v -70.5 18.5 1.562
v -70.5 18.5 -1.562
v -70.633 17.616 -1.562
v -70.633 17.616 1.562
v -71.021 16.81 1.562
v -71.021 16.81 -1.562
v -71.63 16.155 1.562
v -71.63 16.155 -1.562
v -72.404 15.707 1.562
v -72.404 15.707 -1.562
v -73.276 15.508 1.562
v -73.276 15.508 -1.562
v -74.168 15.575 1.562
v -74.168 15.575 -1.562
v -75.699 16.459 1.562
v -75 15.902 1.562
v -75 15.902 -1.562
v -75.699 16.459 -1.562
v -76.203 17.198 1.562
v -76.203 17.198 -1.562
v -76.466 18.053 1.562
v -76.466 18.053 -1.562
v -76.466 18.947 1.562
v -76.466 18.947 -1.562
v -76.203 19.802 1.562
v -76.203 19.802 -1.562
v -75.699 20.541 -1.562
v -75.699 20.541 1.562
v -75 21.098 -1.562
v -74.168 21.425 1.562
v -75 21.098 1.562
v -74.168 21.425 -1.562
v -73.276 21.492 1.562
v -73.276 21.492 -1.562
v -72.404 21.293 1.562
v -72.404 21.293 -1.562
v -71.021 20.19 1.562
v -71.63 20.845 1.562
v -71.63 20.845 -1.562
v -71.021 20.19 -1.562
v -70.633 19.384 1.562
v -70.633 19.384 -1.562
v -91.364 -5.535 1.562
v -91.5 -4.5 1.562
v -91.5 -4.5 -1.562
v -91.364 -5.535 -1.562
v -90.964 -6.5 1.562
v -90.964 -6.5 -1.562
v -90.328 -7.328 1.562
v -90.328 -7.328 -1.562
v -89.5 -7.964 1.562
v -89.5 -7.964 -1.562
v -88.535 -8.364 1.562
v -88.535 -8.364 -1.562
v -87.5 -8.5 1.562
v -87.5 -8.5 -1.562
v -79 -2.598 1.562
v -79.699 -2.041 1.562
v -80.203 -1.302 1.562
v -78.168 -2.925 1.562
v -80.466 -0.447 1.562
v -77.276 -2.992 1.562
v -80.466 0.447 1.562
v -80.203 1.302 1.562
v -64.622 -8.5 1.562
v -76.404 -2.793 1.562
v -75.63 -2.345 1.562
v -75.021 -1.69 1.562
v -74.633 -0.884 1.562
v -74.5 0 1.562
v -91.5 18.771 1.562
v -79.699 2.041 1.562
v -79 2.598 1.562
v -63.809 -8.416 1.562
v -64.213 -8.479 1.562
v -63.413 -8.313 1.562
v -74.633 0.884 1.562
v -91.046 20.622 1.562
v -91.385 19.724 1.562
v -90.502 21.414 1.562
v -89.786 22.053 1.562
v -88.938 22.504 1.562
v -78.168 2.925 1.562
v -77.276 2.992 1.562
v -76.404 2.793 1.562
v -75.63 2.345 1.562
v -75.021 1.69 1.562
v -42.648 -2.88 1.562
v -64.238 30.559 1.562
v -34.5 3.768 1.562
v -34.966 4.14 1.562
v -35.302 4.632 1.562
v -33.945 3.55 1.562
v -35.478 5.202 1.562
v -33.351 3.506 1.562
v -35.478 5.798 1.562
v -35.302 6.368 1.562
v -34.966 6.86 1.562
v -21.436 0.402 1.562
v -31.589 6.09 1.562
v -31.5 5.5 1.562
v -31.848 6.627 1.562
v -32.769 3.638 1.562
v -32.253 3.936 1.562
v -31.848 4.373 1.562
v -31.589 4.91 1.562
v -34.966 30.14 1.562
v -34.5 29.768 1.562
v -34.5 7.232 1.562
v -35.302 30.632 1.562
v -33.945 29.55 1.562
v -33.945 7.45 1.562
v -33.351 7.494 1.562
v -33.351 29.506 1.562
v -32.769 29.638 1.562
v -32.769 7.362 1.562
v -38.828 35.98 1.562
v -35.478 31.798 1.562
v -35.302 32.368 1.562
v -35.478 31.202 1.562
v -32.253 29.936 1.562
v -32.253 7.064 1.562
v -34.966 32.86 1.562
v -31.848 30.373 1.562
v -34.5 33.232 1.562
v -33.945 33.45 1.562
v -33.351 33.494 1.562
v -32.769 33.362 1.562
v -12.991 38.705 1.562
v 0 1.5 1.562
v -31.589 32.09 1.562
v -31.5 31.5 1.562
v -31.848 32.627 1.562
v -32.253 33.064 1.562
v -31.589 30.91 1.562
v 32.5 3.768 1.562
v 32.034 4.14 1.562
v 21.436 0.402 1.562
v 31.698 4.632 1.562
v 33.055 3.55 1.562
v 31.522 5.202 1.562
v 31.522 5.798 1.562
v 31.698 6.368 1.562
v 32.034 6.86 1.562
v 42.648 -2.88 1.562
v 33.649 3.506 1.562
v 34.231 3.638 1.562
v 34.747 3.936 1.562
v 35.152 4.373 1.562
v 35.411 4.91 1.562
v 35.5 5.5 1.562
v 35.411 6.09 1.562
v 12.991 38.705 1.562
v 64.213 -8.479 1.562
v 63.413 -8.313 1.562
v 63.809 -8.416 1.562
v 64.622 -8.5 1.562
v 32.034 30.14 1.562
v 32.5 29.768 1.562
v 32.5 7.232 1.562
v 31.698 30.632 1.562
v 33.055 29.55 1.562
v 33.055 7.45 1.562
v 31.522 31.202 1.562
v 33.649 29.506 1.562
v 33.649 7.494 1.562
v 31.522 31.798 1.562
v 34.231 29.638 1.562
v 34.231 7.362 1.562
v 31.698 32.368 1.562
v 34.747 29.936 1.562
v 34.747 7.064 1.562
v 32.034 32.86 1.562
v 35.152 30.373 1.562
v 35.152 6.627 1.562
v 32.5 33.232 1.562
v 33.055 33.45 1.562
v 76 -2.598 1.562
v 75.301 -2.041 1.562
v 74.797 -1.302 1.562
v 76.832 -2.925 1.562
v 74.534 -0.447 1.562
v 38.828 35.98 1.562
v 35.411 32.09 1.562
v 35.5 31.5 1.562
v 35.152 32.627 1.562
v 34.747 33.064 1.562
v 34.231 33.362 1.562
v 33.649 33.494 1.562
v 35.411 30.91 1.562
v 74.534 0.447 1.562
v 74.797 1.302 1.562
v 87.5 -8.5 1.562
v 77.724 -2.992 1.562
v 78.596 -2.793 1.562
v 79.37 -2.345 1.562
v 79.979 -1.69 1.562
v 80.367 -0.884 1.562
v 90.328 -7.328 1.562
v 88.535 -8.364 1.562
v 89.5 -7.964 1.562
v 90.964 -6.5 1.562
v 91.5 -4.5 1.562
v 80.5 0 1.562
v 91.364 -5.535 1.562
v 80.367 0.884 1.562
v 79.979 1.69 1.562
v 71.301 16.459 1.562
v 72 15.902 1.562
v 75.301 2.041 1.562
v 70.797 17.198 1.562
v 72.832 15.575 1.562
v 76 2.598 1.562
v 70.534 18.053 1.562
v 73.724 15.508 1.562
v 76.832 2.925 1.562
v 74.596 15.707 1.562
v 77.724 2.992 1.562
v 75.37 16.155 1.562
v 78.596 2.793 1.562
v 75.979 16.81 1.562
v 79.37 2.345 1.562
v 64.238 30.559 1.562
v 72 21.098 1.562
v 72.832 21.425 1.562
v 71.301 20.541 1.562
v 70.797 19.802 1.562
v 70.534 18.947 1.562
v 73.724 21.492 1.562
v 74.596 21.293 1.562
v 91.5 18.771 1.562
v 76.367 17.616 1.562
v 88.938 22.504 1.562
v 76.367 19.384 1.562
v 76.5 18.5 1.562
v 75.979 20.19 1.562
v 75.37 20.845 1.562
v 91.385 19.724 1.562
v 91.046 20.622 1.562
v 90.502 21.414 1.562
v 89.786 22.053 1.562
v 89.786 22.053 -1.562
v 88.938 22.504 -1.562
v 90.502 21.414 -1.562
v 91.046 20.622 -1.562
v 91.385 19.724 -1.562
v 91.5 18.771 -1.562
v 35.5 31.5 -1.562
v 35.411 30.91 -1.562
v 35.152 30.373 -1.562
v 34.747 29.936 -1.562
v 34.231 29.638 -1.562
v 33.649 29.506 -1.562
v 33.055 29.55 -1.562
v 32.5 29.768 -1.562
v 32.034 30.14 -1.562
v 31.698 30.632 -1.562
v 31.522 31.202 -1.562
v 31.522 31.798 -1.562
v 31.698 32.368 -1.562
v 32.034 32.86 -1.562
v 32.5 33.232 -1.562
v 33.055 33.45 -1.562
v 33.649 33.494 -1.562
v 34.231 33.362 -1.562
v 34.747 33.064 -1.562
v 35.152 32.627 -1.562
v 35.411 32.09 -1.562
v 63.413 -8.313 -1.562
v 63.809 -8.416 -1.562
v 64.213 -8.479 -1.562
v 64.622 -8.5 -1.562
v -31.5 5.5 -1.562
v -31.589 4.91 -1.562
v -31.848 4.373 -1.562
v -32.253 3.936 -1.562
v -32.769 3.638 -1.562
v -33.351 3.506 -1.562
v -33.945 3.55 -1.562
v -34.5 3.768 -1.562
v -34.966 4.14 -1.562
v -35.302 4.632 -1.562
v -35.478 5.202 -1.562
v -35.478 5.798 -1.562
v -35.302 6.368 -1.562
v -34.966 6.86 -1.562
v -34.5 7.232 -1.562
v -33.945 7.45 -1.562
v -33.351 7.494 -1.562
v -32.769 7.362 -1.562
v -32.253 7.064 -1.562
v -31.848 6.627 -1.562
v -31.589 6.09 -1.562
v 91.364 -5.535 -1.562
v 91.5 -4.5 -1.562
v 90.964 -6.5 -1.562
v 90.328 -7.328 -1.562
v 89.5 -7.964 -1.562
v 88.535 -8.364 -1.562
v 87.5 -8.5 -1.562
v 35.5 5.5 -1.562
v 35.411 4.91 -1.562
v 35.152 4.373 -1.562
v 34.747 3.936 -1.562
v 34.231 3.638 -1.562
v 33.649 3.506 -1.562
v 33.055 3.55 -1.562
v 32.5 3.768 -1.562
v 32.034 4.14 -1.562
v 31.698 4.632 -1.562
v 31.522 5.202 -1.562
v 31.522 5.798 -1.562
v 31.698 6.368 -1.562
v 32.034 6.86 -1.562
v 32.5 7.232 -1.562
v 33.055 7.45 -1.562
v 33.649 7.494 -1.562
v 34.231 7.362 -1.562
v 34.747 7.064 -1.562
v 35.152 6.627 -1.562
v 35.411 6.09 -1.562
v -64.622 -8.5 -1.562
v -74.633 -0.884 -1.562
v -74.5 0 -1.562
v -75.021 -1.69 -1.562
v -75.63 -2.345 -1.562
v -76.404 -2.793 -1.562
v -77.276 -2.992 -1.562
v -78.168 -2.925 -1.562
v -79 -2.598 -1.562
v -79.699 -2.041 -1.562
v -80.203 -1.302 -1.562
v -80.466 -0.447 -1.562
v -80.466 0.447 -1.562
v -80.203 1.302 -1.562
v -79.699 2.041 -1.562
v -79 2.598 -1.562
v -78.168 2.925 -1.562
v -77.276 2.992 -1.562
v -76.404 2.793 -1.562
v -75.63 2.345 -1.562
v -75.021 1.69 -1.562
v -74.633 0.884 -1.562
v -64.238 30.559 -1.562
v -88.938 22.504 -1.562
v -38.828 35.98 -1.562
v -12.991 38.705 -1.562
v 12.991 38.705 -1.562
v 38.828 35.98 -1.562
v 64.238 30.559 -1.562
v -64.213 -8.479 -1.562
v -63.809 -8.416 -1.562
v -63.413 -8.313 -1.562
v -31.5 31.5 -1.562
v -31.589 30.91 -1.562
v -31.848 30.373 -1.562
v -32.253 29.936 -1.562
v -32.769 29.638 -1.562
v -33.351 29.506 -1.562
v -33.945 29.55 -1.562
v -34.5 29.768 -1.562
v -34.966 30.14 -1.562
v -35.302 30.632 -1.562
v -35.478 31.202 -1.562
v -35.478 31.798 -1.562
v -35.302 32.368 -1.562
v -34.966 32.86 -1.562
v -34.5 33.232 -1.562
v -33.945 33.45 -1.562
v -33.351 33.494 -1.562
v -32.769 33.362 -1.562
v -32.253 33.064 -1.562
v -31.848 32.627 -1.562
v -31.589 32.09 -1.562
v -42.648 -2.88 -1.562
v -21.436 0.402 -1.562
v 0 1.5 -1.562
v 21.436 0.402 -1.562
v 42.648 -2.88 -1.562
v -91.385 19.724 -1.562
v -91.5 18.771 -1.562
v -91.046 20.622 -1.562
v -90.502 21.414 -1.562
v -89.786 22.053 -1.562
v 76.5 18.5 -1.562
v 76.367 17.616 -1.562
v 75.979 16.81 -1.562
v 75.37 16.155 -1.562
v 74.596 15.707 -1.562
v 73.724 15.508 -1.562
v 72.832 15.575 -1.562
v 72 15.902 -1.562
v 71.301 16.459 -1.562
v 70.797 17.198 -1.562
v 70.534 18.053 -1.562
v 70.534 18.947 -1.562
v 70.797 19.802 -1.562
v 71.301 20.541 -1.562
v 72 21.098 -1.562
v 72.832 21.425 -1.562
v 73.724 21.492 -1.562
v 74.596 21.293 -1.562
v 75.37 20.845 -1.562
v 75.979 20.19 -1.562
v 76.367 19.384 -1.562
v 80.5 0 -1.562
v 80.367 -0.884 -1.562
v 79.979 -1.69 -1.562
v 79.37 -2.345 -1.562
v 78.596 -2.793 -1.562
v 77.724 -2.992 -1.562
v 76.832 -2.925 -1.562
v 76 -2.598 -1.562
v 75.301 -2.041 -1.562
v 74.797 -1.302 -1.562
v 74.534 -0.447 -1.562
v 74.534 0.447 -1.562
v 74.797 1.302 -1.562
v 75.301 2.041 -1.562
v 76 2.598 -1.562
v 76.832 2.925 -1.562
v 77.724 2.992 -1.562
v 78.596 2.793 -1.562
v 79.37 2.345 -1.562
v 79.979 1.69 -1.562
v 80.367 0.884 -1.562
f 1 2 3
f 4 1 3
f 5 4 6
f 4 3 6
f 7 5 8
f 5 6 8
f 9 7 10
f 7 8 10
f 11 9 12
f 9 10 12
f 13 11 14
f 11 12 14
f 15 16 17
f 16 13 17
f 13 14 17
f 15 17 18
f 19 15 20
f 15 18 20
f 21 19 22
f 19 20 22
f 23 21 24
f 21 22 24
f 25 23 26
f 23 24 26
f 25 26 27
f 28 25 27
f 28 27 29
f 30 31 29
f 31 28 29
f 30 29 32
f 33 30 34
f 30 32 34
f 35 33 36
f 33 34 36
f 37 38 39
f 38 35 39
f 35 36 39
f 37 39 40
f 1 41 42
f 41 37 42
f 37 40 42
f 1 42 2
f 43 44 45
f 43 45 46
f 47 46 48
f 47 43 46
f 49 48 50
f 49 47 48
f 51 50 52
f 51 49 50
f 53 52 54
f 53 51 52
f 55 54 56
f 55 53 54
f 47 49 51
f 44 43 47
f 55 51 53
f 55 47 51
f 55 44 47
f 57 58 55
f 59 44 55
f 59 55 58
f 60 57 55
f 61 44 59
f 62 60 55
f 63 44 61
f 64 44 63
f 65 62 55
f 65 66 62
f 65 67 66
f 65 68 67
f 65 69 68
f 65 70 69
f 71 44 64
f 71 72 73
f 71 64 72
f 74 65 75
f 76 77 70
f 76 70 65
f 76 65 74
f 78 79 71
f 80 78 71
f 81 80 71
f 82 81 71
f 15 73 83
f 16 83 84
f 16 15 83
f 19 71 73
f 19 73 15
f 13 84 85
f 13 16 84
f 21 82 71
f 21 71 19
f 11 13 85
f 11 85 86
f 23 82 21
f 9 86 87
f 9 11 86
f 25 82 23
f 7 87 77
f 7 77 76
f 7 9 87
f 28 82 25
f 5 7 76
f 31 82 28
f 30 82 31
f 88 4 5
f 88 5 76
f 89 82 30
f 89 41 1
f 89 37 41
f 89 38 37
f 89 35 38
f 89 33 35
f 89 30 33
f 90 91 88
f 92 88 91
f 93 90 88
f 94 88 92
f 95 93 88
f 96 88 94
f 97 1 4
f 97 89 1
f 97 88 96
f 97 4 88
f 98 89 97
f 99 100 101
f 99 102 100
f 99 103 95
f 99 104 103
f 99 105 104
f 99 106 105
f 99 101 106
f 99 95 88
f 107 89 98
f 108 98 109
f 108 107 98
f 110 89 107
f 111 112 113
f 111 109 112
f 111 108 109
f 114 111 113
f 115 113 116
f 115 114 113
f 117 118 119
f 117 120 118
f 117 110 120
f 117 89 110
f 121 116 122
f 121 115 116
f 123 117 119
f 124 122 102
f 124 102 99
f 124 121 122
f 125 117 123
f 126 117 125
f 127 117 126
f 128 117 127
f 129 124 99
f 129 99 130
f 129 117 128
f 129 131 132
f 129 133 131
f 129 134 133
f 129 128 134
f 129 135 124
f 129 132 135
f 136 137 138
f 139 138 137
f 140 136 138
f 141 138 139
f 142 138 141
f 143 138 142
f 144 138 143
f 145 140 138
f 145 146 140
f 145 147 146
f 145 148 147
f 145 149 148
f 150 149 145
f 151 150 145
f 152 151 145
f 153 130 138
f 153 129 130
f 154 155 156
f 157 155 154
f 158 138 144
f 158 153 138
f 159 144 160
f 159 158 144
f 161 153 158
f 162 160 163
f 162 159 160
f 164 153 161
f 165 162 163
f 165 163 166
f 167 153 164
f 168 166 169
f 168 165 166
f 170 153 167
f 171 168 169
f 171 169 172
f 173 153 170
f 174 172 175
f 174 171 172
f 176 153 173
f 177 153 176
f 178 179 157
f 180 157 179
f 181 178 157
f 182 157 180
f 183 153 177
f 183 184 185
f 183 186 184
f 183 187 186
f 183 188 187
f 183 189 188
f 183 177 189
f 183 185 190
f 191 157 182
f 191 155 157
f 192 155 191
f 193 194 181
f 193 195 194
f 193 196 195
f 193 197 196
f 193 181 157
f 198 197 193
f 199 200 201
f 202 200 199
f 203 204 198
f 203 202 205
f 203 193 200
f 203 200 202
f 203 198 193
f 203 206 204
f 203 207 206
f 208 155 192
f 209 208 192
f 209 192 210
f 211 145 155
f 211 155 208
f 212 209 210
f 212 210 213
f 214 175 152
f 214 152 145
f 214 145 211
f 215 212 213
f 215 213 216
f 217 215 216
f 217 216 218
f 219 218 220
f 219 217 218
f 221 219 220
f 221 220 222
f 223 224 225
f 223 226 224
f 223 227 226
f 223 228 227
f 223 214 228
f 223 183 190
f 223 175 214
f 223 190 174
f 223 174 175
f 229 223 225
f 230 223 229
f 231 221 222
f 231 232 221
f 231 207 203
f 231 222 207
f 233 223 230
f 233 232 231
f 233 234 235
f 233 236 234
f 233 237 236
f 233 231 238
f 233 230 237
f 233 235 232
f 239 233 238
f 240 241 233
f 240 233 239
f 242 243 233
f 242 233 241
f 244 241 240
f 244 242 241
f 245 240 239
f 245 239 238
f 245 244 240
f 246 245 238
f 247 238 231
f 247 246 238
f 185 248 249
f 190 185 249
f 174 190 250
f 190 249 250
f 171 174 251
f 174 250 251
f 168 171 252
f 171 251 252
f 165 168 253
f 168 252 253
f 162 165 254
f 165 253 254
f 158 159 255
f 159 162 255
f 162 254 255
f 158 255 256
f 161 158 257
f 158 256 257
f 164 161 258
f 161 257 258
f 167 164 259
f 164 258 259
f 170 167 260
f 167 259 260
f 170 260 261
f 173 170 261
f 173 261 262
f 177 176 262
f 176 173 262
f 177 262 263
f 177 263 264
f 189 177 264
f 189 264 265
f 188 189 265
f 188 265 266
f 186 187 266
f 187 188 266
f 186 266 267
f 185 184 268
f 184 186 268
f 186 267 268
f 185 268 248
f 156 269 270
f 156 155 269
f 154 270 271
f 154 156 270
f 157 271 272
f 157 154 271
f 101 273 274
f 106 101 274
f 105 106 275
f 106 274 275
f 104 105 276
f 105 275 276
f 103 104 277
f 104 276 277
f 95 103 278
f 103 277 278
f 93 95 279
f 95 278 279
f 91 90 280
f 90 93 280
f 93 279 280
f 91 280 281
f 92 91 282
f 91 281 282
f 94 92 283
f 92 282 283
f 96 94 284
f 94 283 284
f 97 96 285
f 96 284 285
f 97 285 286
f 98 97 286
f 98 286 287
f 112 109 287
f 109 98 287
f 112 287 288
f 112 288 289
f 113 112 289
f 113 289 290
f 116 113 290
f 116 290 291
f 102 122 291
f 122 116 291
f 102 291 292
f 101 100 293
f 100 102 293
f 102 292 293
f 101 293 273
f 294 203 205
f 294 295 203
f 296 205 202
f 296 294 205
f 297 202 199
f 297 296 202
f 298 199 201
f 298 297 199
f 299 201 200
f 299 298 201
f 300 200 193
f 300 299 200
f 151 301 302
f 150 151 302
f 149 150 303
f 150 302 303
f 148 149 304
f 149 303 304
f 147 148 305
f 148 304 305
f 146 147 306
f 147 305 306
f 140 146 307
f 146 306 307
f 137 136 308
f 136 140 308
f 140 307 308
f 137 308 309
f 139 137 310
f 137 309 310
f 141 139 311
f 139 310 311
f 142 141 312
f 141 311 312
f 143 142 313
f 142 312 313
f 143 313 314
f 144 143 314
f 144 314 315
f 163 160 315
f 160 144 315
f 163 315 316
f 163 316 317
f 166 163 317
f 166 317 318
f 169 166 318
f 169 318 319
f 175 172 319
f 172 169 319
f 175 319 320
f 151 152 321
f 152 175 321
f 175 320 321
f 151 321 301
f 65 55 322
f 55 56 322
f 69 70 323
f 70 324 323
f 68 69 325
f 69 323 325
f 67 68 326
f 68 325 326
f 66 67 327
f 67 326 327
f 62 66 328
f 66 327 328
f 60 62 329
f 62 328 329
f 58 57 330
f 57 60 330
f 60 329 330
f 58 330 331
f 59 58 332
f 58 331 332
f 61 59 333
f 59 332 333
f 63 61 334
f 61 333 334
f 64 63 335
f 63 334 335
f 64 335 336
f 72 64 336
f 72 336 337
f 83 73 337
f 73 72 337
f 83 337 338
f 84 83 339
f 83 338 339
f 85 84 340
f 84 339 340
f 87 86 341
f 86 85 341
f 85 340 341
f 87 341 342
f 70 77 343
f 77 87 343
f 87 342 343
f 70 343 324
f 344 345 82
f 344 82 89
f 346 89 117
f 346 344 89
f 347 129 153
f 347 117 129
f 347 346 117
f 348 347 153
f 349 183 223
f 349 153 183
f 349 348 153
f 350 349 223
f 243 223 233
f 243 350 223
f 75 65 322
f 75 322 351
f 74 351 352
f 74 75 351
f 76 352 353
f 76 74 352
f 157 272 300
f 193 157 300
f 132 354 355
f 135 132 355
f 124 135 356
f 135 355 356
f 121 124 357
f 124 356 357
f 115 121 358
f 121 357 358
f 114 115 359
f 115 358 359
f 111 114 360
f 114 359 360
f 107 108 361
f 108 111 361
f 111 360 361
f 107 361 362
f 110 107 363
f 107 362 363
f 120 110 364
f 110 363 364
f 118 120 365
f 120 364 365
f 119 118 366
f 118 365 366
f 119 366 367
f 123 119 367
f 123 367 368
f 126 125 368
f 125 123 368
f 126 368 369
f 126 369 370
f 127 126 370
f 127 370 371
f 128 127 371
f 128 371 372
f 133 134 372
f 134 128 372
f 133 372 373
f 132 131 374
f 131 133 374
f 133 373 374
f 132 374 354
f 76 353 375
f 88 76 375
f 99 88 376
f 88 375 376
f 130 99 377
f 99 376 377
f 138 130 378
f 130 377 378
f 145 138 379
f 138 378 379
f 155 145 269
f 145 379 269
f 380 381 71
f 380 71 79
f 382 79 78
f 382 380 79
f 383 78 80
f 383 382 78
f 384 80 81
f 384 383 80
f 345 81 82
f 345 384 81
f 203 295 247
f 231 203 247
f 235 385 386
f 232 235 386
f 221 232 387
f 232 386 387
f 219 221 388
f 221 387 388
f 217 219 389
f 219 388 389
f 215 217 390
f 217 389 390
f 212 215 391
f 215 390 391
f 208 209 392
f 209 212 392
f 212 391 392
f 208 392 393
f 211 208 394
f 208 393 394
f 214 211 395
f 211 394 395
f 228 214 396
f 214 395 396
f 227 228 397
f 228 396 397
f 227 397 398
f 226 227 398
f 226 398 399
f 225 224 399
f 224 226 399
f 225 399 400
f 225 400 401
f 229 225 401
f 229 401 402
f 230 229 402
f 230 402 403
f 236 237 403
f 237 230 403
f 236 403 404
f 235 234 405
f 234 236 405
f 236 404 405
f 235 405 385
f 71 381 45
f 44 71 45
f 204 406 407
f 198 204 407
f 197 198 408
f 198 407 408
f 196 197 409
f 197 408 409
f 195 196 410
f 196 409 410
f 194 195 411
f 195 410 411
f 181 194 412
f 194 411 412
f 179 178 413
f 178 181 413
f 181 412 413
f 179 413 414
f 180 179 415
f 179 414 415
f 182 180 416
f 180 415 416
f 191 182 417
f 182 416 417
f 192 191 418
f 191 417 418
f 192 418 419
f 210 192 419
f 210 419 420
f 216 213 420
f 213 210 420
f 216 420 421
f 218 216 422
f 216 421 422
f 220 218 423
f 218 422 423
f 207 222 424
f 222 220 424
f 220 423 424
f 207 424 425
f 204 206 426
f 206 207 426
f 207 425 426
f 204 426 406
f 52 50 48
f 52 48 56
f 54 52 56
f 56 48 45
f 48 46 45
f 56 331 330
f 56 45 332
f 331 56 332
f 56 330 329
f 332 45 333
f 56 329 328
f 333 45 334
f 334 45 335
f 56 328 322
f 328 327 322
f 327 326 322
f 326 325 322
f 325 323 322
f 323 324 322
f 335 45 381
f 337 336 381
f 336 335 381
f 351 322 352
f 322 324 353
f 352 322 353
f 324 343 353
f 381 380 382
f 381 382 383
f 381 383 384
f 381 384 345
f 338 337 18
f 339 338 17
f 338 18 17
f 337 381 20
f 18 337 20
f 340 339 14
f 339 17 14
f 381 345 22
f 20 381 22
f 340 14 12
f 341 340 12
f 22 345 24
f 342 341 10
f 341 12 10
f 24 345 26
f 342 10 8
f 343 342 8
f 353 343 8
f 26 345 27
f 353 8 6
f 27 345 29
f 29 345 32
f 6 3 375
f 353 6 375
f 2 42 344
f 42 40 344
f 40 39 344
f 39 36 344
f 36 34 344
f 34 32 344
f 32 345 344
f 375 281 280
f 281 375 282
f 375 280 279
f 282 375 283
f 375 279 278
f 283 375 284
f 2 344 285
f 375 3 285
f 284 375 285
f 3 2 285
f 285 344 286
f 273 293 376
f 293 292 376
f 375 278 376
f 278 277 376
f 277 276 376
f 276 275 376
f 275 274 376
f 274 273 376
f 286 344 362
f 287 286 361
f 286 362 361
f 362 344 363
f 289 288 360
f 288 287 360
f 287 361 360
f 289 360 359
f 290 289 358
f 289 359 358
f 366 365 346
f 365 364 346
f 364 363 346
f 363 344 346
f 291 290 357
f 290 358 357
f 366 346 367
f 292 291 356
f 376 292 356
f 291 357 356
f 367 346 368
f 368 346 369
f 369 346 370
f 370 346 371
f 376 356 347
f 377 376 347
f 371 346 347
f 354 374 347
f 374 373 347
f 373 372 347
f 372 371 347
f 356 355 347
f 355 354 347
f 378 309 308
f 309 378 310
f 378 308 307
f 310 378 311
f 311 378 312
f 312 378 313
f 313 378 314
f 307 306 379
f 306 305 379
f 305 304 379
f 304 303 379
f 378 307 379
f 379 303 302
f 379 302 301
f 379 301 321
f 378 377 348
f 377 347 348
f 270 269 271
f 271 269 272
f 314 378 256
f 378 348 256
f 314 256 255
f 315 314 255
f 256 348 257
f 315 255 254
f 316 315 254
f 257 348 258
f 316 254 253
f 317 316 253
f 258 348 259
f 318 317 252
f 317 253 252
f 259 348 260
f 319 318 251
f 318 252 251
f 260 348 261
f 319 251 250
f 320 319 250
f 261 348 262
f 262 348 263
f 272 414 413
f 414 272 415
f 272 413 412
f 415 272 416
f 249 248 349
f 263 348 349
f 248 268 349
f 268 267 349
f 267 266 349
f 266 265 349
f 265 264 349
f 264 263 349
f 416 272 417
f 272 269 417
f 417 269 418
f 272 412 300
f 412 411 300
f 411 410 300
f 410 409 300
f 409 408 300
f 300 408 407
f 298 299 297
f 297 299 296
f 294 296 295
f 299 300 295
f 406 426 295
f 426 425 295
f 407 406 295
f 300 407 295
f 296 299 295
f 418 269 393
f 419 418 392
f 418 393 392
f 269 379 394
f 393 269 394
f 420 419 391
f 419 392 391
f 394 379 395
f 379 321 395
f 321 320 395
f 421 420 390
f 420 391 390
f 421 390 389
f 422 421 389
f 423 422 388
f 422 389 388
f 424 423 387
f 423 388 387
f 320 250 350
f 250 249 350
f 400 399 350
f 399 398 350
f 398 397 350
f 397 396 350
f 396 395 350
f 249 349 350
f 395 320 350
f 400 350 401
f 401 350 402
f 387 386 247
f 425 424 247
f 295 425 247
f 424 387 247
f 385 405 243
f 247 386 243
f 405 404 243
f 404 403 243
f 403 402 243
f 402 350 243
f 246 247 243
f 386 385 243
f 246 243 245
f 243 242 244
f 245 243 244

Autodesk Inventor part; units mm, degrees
ref_plane "YZ Plane" through (0, 0, 0) normal (1, 0, 0) x (0, 1, 0)
ref_plane "XZ Plane" through (0, 0, 0) normal (0, 1, 0) x (-1, 0, 0)
ref_plane "XY Plane" through (0, 0, 0) normal (0, 0, 1) x (1, 0, 0)
sketch "Sketch1" plane through (0, 0, 0) normal (0, 0, 1) x (1, 0, 0)
  line L0 (-91.5, -8.5) -> (-64, -8.5)
  line L1 (-91.5, 21.5) -> (-91.5, -8.5)
  line L2 (64, -8.5) -> (91.5, -8.5)
  line L3 (91.5, -8.5) -> (91.5, 21.5)
  arc A0 (64, -8.5) -> (-64, -8.5) centre (0, -208.3) ccw
  arc A1 (91.5, 21.5) -> (-91.5, 21.5) centre (0, -208.3) ccw
  circle A2 centre (-77.5, 0) radius 3
  circle A3 centre (77.5, 0) radius 3
  circle A4 centre (-73.5, 18.5) radius 3
  circle A5 centre (73.5, 18.5) radius 3
  line L4 (-33.5, 5.5) -> (33.5, 5.5) construction
  line L5 (33.5, 5.5) -> (33.5, 31.5) construction
  line L6 (33.5, 31.5) -> (-33.5, 31.5) construction
  line L7 (-33.5, 31.5) -> (-33.5, 5.5) construction
  line L8 (-33.5, 5.5) -> (33.5, 31.5) construction
  line L9 (33.5, 5.5) -> (-33.5, 31.5) construction
  circle A6 centre (-33.5, 31.5) radius 2
  circle A7 centre (33.5, 31.5) radius 2
  circle A8 centre (33.5, 5.5) radius 2
  circle A9 centre (-33.5, 5.5) radius 2
  point P0 (0, 0)
  point P1 (0, 18.5)
  point P2 (0, 18.5)
  dimension "d0" = 155
  dimension "d1" = 77.5
  dimension "d2" = 8.5
  dimension "d3" = 27.5
  dimension "d4" = 14
  dimension "d5" = 14
  dimension "d6" = 30
  dimension "d12" = 6
  dimension "d13" = 18.5
  dimension "d14" = 4
  dimension "d15" = 18.5
  dimension "d16" = 4
  dimension "d17" = 67
  dimension "d18" = 26
  dimension "d19" = 4
  dimension "d20" = 10
  dimension "d22" = 40
extrude "Extrusion1" add sketch "Sketch1" along normal mid plane 3.1242
fillet "Fillet1" radius 4 6 edges at (-91.5, -8.5, 0) (-91.5, 21.5, 0) (-64, -8.5, 0) (64, -8.5, 0) (91.5, -8.5, 0) (91.5, 21.5, 0)
equation "\"d1\" = 0.5 * d0"
properties part number "Y Motor Plate" material "Aluminum 6061"
